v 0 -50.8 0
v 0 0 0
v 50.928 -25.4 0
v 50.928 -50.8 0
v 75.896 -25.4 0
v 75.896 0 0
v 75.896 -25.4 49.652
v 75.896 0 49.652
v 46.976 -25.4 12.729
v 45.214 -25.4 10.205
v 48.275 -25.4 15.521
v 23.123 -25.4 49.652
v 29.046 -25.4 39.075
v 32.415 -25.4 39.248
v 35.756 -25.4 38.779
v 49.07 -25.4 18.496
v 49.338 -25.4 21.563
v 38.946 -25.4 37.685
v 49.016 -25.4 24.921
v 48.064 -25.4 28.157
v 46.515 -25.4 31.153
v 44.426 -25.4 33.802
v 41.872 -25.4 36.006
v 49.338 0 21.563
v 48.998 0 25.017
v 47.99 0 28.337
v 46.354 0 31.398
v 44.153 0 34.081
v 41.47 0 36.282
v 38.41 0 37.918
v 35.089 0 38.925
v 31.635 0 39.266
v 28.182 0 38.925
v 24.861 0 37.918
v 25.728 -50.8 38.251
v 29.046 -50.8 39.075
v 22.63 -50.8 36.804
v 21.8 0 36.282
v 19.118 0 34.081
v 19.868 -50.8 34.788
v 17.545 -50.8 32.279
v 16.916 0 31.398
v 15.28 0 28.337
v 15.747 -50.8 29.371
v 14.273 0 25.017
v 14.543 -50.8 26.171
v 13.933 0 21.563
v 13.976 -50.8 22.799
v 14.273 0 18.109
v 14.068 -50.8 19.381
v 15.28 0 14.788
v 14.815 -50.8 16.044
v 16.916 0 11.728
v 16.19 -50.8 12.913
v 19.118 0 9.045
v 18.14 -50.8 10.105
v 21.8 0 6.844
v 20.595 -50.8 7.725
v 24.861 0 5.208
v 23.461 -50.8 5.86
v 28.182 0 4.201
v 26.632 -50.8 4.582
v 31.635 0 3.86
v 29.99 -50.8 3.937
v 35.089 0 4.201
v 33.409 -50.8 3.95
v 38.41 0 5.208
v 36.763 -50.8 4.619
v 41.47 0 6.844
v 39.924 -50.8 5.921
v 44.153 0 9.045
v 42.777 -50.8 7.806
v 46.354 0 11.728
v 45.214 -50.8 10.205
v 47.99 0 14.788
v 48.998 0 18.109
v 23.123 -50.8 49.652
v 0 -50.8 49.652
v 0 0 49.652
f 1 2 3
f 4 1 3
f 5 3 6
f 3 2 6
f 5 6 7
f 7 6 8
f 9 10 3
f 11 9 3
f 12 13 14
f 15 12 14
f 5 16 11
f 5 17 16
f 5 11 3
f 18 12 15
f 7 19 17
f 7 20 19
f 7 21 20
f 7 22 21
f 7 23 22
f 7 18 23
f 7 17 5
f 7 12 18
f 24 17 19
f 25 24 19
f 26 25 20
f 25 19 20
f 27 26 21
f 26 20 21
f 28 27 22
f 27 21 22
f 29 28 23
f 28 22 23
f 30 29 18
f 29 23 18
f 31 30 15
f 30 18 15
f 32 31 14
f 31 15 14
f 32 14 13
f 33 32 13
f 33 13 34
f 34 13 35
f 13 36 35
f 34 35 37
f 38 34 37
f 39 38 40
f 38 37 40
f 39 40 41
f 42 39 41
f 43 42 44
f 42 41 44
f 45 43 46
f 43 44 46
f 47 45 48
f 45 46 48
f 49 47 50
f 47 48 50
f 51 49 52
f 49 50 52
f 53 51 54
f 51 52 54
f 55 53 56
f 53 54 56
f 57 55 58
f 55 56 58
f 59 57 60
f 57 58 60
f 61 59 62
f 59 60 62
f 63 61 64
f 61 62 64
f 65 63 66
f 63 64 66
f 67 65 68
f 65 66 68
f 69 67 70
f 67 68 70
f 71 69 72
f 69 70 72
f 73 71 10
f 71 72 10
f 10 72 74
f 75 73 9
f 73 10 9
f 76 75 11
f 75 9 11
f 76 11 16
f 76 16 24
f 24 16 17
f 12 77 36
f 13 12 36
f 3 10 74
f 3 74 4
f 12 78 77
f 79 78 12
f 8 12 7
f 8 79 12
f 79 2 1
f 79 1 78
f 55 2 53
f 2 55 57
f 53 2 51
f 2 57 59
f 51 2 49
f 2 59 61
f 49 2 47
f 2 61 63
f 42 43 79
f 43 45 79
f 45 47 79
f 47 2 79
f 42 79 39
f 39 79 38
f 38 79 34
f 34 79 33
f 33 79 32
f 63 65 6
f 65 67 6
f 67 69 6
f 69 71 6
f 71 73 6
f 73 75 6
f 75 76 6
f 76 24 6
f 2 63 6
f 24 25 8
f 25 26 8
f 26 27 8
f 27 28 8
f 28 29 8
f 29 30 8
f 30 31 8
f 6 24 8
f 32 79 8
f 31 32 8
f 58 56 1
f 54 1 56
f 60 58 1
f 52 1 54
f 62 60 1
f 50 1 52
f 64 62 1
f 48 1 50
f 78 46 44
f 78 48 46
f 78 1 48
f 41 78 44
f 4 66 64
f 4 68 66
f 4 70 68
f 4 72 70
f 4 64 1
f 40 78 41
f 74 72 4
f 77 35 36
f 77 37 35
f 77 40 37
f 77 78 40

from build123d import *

# Parameters (mm, degrees)
F0_W     = 75.8960098028
F0_H     = 49.6515966952
F1_DEPTH = 50.8
F3_DEPTH = 25.4
F4_R     = 17.7026194938
F5_DEPTH = 50.8


with BuildPart() as f1:
    # F0 (on Front) → F1 (new body)
    with BuildSketch(Plane.XZ):
        with Locations((37.9480049014, 24.8257983476)):
            Rectangle(F0_W, F0_H)
    extrude(amount=F1_DEPTH)

    # F2 (on face) → F3 (cut)
    with BuildSketch(Plane.XZ.offset(50.8)):
        Polygon((75.8960098028, 49.6515966952), (23.1234580278, 49.6515966952), (50.928350538, 0), (75.8960098028, 0), align=None)
    extrude(amount=-F3_DEPTH, mode=Mode.SUBTRACT)

    # F4 (on face) → F5 (cut)
    with BuildSketch(Plane.XZ.offset(50.8)):
        with Locations((31.635157764, 21.5629786253)):
            Circle(F4_R)
    extrude(amount=-F5_DEPTH, mode=Mode.SUBTRACT)


solid = f1.part
